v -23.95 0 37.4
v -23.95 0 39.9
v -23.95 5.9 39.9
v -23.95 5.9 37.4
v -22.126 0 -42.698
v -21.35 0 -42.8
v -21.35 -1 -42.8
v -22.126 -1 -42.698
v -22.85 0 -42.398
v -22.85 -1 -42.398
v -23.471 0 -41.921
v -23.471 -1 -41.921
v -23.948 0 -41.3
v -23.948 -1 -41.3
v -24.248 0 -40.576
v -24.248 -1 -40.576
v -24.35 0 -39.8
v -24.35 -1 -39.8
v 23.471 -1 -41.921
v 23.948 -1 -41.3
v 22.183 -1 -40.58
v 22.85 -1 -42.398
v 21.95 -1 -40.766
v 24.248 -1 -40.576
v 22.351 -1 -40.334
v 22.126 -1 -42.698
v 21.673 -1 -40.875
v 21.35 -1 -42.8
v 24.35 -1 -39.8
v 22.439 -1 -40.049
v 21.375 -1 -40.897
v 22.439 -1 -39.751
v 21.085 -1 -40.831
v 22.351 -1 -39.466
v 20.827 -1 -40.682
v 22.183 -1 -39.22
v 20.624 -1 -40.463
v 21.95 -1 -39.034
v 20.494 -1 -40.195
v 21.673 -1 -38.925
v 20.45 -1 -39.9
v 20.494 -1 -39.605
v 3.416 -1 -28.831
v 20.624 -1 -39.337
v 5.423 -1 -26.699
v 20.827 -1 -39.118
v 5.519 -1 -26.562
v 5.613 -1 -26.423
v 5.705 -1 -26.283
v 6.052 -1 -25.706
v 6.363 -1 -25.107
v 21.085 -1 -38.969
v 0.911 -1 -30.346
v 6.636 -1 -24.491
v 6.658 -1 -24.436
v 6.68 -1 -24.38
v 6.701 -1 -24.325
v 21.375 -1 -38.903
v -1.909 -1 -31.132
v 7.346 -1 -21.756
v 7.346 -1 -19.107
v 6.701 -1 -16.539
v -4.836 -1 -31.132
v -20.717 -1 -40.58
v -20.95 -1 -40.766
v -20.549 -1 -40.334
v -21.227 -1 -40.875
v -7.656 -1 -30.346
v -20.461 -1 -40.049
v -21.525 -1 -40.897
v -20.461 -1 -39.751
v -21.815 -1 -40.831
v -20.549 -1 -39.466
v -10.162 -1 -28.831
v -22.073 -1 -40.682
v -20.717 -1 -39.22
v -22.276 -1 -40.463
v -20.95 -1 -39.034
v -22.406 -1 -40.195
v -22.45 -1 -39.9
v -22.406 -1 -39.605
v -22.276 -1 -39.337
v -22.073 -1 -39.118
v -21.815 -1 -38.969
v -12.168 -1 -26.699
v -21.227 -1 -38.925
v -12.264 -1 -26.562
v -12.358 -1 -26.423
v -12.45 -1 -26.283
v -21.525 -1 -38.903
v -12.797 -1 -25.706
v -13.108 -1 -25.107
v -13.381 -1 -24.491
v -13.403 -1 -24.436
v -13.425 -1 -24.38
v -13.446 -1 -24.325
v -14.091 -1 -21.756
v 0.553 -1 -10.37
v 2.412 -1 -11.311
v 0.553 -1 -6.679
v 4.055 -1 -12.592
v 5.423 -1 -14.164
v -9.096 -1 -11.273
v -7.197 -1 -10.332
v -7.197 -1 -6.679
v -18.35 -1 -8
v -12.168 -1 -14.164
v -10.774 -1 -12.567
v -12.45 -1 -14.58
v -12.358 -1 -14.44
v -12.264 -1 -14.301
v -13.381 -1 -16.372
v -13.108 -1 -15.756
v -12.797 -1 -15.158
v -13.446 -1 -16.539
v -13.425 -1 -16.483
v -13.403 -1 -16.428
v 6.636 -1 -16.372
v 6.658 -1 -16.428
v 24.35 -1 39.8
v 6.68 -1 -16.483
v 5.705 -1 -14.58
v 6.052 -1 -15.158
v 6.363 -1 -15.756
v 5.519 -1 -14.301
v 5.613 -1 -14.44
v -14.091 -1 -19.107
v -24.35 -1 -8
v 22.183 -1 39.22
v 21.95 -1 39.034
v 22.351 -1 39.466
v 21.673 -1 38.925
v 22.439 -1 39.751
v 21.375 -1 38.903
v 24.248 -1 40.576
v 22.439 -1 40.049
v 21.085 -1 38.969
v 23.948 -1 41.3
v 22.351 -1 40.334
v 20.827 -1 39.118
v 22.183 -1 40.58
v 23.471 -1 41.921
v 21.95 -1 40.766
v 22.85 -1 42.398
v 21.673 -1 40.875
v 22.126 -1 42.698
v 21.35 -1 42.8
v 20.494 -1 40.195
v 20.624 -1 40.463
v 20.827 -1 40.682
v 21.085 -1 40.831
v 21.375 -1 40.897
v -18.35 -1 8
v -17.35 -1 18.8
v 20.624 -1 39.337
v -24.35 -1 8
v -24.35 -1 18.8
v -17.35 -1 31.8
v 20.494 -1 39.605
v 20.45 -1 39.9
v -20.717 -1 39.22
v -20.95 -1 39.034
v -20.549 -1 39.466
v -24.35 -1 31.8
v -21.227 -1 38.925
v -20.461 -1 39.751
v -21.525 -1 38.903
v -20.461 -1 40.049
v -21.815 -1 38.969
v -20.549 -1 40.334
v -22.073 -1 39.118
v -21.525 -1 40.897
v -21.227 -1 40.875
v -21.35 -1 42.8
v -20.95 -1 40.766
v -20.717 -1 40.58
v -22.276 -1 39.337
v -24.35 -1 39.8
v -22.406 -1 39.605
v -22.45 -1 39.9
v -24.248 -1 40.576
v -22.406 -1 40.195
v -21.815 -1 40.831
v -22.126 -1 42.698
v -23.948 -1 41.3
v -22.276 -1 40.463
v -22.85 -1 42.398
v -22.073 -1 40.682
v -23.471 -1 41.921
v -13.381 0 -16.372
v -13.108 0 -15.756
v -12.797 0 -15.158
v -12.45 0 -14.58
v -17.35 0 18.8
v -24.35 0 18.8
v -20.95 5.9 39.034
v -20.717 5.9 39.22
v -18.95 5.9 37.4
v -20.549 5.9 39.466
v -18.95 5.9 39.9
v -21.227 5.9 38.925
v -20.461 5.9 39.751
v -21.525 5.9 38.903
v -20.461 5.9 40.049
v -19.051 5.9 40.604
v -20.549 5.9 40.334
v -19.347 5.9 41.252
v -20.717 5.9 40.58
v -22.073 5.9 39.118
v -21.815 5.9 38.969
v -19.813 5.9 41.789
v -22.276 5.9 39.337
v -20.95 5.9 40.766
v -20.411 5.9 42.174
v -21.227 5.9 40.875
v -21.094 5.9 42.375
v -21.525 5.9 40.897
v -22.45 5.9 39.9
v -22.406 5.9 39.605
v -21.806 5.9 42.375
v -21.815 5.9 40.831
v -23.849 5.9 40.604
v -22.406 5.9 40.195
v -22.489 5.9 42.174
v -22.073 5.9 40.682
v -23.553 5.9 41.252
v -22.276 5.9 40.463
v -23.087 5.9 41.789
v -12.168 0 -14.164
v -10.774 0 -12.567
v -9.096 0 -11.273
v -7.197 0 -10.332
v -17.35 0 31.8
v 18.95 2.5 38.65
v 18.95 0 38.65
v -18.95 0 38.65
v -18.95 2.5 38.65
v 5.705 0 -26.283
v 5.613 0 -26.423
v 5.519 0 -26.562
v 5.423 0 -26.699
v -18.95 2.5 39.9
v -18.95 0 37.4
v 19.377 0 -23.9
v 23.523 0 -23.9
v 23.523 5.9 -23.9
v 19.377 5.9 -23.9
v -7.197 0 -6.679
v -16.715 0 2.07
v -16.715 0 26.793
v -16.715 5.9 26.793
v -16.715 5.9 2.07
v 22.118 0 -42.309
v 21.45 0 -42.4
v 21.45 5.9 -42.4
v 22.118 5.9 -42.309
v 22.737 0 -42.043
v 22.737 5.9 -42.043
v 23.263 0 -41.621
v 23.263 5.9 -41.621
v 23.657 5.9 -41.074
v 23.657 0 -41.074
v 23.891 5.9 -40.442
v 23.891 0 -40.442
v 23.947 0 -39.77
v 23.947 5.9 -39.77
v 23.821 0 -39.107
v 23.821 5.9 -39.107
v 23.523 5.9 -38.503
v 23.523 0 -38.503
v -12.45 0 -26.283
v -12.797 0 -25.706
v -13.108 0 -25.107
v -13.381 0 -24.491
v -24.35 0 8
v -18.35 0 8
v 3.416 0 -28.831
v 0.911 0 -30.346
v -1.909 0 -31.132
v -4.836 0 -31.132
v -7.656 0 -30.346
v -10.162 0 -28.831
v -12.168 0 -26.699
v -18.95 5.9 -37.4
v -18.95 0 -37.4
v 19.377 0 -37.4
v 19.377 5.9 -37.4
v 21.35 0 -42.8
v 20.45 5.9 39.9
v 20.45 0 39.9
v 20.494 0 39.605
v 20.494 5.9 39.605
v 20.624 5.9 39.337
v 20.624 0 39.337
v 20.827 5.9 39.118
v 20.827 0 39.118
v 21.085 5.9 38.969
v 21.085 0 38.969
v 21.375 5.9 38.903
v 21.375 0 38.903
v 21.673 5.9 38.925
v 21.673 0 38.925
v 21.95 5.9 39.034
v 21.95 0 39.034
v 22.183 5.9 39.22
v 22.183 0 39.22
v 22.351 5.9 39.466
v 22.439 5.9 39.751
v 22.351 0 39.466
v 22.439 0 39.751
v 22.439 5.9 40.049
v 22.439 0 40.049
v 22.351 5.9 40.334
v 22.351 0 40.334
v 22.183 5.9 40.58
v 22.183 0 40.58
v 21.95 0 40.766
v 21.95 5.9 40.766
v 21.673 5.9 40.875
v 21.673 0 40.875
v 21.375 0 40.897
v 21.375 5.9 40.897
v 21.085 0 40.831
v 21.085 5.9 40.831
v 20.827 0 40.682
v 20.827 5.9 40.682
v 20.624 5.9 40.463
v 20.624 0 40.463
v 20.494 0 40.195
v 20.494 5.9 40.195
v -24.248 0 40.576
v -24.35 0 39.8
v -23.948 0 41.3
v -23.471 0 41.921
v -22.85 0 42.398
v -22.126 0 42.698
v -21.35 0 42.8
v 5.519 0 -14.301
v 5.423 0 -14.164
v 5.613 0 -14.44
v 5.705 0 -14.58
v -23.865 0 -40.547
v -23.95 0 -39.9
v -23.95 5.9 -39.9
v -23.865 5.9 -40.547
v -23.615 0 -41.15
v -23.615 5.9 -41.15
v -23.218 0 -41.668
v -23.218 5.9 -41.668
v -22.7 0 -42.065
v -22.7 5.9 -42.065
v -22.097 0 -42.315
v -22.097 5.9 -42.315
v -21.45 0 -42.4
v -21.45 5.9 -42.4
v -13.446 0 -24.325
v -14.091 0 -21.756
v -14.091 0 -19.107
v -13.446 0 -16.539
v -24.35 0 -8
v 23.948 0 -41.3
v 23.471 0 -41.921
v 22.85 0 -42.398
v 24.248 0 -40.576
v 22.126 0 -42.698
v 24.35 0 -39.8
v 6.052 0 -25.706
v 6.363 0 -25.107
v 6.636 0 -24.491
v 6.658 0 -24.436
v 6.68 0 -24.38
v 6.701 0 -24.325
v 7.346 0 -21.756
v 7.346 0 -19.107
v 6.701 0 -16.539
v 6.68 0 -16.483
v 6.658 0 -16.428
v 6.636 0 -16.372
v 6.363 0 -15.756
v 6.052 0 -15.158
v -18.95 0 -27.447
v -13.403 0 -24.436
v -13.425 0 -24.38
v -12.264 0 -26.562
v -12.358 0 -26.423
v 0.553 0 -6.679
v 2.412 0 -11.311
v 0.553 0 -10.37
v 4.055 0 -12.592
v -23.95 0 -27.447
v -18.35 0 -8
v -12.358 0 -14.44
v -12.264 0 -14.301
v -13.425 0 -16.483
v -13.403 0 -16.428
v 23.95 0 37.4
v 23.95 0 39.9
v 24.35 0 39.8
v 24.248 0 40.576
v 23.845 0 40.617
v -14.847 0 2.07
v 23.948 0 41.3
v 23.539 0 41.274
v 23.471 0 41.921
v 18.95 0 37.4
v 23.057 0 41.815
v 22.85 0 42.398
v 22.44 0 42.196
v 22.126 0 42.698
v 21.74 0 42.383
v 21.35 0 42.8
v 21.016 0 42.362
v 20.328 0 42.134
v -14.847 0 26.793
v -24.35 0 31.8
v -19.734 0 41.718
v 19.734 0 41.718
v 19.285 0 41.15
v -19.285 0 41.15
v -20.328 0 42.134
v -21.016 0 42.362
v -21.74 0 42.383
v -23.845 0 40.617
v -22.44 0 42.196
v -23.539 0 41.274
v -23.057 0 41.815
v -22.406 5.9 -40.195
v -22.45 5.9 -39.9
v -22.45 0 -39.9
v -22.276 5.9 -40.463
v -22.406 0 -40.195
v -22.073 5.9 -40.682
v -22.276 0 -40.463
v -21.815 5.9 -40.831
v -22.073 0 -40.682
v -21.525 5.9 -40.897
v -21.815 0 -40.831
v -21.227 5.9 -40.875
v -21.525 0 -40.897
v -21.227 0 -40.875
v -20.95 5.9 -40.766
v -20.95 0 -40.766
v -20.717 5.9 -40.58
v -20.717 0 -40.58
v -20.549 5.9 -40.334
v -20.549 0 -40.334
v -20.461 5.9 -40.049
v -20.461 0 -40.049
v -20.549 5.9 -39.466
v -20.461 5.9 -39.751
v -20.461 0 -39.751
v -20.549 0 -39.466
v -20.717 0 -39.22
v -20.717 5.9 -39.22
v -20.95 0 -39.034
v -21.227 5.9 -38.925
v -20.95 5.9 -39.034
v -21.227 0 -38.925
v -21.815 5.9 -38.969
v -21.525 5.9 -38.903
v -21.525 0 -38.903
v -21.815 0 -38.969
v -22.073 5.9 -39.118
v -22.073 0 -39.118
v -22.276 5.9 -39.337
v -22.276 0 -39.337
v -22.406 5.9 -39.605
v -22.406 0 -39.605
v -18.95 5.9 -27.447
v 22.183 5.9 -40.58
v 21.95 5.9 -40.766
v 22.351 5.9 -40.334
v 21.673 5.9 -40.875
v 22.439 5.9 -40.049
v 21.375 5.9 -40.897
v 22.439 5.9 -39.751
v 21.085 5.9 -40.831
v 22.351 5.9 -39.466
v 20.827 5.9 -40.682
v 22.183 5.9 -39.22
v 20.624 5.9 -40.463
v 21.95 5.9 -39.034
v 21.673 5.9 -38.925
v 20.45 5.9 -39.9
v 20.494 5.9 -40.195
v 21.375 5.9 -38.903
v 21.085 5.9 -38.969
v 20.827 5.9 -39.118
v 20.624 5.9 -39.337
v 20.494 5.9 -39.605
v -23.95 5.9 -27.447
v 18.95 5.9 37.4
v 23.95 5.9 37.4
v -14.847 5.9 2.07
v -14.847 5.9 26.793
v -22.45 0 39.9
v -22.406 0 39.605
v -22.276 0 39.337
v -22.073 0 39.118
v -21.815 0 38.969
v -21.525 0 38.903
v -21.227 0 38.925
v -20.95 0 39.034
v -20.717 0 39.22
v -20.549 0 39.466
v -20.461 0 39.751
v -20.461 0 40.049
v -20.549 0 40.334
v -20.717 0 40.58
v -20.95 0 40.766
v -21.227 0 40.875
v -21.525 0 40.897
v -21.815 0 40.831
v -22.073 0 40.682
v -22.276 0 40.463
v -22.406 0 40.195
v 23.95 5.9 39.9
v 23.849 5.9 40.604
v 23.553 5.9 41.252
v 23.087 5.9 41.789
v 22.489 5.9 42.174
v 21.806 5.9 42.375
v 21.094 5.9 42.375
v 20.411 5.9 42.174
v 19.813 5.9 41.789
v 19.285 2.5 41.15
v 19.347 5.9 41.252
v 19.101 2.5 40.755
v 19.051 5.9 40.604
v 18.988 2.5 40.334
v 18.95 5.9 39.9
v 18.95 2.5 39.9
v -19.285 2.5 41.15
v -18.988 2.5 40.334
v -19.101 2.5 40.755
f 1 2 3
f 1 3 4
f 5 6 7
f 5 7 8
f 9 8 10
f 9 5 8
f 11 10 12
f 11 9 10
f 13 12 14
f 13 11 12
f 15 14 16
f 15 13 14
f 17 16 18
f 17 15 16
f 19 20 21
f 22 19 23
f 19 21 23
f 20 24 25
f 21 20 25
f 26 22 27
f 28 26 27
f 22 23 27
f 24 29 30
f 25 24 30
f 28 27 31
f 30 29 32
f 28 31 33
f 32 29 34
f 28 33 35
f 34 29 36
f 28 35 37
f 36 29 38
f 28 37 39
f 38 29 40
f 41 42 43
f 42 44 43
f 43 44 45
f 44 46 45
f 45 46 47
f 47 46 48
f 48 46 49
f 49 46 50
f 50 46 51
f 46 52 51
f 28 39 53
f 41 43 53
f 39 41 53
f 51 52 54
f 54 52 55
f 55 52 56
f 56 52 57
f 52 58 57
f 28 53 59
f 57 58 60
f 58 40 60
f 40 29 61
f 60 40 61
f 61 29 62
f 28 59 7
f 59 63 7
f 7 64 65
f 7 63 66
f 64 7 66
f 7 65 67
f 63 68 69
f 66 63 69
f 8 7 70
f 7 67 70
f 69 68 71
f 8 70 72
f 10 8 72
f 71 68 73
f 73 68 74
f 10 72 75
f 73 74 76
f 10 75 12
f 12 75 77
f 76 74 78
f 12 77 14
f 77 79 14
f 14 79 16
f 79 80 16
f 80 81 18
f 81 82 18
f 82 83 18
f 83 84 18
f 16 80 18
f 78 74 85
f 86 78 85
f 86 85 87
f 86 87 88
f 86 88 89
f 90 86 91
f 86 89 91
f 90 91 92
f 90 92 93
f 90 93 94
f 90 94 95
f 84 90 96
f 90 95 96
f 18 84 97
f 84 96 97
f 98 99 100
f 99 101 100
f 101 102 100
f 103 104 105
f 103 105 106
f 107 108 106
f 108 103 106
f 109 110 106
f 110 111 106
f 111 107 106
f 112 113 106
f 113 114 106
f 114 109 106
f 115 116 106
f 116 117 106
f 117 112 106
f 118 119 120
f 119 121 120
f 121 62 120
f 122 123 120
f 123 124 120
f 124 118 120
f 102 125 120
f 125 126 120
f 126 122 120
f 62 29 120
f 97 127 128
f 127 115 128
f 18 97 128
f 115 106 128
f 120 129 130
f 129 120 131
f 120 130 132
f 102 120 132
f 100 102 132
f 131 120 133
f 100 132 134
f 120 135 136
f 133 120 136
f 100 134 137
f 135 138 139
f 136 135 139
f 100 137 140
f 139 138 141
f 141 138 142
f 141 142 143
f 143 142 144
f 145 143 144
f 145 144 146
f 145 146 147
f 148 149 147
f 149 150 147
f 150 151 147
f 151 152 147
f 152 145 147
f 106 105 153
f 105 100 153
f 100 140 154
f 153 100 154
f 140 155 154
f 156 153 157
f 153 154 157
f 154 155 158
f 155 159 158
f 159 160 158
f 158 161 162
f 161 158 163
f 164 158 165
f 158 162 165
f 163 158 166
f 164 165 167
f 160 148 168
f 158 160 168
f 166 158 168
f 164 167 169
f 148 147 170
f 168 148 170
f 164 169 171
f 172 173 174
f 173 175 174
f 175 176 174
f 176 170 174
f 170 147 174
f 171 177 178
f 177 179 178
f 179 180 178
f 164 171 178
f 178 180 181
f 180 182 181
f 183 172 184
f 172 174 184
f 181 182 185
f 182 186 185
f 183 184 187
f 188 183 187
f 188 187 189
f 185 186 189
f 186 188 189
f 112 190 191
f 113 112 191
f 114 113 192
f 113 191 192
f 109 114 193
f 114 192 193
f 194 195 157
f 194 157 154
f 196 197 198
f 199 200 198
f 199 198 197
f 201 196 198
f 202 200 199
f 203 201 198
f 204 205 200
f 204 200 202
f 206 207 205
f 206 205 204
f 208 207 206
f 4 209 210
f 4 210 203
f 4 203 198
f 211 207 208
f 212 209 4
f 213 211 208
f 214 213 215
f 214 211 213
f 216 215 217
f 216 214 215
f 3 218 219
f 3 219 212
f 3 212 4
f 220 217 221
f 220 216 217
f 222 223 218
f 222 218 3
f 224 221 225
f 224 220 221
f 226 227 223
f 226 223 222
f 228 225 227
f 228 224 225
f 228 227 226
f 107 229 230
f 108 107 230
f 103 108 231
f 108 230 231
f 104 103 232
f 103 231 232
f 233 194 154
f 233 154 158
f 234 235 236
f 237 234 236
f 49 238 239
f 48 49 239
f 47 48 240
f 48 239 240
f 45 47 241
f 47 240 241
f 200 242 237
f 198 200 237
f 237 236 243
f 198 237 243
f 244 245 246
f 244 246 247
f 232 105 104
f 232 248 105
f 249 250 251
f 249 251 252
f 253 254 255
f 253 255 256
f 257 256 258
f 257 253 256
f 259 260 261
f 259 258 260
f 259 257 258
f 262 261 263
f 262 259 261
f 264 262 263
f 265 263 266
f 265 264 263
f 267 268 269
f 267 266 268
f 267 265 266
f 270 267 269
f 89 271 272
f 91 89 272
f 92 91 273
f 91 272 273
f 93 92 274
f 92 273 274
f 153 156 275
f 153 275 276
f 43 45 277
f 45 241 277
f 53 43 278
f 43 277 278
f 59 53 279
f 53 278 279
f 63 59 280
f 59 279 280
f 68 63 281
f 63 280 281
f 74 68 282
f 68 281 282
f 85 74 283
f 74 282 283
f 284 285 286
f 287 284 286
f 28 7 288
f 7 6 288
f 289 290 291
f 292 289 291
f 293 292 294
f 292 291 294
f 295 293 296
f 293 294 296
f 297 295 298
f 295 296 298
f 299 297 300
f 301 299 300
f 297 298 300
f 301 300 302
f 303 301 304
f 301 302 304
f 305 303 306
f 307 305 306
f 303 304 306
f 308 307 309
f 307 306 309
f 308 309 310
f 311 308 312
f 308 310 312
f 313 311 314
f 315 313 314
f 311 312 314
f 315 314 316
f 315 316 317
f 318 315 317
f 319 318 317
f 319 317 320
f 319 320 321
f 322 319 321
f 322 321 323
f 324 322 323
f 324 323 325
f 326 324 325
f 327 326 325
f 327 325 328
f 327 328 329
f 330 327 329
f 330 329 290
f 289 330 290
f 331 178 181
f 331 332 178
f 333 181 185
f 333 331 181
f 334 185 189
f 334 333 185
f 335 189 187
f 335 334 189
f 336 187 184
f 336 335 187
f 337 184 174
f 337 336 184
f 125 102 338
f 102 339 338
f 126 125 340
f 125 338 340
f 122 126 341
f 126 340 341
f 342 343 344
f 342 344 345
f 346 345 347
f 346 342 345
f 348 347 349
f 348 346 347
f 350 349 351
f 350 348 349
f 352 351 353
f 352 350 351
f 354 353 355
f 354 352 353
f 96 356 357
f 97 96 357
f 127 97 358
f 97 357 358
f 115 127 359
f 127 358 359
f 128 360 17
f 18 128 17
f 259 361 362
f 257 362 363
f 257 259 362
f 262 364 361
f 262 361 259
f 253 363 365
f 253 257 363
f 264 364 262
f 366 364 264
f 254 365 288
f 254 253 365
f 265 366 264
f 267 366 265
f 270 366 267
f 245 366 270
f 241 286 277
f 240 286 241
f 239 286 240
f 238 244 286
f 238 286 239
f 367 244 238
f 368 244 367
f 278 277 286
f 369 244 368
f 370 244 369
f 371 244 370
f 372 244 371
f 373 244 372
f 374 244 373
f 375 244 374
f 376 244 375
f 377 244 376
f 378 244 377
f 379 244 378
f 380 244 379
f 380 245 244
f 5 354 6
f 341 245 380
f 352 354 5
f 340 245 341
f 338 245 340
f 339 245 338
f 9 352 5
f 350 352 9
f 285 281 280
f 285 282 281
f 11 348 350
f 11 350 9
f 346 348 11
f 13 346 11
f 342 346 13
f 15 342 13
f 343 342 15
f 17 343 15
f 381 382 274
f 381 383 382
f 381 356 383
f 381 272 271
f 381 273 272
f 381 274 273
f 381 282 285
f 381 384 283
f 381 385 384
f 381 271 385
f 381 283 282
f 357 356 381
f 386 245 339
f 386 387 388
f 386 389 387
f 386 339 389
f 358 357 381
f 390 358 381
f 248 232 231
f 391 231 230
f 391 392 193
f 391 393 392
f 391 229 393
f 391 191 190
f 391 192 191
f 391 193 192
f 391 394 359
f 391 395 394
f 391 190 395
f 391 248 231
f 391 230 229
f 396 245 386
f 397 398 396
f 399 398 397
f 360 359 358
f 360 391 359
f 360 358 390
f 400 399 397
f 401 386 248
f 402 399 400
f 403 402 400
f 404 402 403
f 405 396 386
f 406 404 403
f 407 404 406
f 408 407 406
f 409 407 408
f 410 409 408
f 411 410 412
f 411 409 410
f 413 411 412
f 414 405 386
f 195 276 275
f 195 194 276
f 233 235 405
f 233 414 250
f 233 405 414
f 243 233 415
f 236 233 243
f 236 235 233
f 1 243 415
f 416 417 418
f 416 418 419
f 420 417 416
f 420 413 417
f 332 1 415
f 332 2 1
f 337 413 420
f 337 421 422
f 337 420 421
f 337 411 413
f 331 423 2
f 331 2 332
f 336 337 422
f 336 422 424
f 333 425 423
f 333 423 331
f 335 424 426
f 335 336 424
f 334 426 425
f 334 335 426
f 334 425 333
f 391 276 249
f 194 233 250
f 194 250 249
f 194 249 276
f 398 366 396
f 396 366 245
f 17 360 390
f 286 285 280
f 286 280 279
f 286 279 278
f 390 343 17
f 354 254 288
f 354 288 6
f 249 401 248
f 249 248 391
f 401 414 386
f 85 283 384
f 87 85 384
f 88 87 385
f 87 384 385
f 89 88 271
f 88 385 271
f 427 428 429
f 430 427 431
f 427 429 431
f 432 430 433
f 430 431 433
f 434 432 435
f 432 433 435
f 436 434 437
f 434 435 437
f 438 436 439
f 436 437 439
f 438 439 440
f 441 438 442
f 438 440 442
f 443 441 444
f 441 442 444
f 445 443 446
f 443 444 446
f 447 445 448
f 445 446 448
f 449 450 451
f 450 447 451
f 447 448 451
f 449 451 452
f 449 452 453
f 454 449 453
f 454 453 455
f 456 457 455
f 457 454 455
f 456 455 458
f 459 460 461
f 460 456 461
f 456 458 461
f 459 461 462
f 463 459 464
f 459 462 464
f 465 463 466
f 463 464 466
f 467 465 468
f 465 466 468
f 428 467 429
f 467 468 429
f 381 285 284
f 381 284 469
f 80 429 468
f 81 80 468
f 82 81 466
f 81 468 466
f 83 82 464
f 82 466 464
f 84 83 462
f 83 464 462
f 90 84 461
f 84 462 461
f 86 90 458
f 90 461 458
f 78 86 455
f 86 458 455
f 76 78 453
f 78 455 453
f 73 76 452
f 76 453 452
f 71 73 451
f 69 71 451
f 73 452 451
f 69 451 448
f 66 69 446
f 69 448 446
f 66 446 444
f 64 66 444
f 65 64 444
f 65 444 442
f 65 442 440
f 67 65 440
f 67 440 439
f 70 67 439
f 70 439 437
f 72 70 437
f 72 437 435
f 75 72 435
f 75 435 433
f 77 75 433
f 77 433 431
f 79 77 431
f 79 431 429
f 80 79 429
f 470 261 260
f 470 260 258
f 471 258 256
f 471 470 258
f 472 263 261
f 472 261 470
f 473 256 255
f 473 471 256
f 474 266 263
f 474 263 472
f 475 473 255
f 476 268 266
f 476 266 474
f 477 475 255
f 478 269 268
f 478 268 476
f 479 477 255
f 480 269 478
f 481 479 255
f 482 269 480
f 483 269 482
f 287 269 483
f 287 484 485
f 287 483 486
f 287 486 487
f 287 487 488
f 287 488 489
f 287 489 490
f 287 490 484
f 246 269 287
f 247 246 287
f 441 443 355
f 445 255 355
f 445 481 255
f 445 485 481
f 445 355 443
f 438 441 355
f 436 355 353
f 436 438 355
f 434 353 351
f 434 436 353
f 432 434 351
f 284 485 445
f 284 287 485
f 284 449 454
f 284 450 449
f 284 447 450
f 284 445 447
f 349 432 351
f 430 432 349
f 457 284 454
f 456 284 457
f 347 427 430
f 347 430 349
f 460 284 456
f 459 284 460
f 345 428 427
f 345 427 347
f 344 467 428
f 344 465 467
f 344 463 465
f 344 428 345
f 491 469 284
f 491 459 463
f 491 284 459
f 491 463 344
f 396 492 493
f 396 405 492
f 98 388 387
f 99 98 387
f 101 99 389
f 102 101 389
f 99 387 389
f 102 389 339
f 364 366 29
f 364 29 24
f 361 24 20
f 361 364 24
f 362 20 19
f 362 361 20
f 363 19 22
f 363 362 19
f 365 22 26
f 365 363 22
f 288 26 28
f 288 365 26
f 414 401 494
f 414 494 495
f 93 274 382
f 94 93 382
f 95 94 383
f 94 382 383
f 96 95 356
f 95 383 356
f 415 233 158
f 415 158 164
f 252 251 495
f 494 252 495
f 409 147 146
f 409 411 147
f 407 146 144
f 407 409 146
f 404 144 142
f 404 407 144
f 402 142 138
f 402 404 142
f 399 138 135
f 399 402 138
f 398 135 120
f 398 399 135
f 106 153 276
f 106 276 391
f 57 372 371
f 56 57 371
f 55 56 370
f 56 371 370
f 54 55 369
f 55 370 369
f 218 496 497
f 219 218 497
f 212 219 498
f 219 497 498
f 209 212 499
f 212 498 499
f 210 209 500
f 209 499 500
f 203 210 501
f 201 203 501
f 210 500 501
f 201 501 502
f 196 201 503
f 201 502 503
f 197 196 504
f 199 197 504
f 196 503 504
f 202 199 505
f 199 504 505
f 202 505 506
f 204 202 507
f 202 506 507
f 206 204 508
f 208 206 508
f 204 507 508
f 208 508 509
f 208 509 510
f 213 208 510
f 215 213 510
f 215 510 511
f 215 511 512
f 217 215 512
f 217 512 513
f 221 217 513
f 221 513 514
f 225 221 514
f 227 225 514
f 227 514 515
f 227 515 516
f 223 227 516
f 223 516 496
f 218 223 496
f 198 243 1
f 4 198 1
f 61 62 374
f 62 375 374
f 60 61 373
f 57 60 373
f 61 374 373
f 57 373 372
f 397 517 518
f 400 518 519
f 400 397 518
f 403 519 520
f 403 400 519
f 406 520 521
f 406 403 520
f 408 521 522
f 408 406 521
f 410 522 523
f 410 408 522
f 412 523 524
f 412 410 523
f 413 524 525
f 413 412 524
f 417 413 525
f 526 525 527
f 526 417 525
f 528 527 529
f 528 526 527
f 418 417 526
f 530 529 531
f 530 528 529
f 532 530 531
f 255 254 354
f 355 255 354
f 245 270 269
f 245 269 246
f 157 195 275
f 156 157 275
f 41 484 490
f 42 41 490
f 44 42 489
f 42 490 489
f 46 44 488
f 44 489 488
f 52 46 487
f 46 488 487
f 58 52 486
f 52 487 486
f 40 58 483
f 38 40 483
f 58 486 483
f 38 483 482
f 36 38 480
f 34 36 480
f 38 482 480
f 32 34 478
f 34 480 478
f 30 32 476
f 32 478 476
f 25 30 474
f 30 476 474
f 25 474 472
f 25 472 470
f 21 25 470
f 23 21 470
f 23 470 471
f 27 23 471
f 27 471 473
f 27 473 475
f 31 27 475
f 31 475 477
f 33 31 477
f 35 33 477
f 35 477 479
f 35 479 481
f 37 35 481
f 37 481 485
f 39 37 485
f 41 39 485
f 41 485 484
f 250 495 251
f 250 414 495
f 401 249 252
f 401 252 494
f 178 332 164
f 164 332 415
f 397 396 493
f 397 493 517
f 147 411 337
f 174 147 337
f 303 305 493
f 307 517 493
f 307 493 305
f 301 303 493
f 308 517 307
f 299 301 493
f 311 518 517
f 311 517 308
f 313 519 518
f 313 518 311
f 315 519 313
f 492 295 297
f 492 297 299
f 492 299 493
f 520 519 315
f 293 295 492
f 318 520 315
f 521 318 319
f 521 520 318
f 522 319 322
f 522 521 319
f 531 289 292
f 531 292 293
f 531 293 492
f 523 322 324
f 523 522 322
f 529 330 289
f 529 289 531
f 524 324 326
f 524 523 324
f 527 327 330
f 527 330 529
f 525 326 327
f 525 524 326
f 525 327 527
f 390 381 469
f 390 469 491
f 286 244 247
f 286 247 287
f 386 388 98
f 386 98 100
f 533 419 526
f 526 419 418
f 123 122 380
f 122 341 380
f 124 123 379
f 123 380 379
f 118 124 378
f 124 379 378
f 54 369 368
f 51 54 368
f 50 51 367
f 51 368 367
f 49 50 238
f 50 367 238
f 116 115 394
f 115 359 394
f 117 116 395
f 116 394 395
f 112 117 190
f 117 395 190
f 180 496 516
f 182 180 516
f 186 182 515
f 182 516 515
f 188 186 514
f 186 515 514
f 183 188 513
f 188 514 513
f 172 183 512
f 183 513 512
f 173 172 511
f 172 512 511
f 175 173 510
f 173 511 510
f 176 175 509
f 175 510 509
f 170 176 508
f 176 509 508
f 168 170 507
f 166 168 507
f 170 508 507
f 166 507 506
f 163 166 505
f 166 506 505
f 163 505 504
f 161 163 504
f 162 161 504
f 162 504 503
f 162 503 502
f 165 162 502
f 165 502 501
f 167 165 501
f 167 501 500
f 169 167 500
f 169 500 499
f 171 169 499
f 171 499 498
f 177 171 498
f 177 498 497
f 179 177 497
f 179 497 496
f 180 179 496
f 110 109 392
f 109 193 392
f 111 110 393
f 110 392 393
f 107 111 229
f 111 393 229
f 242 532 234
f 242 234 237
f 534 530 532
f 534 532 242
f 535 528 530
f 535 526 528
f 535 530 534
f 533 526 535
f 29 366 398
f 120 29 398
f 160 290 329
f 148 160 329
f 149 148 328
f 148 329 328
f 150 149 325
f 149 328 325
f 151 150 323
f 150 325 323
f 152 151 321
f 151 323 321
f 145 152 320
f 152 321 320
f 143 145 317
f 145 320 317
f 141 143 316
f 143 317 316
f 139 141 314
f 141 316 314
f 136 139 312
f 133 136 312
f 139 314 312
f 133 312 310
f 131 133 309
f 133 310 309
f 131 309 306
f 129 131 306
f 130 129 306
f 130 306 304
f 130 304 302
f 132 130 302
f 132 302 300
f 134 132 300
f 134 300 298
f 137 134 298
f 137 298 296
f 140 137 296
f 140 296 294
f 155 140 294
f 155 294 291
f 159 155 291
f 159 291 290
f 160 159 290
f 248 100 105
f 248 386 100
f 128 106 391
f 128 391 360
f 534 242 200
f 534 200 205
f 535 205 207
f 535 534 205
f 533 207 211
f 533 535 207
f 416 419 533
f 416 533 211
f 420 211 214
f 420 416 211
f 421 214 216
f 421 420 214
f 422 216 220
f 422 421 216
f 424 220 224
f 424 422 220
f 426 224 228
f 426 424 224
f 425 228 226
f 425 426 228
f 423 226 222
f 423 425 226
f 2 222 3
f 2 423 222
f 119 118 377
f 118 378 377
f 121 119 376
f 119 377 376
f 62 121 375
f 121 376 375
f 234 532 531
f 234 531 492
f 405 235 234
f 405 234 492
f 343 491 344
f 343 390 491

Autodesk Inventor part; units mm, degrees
ref_plane "YZ Plane" through (0, 0, 0) normal (1, 0, 0) x (0, 1, 0)
ref_plane "XZ Plane" through (0, 0, 0) normal (0, 1, 0) x (-1, 0, 0)
ref_plane "XY Plane" through (0, 0, 0) normal (0, 0, 1) x (1, 0, 0)
sketch "Sketch1" plane through (0, 0, 0) normal (0, 1, 0) x (-1, 0, 0)
  line L0 (-21.35, 42.8) -> (21.35, 42.8)
  line L1 (24.35, 39.8) -> (24.35, -39.8)
  line L2 (21.35, -42.8) -> (-21.35, -42.8)
  line L3 (-24.35, -39.8) -> (-24.35, 39.8)
  arc A0 (24.35, 39.8) -> (21.35, 42.8) centre (21.35, 39.8) ccw
  arc A1 (21.35, -42.8) -> (24.35, -39.8) centre (21.35, -39.8) ccw
  arc A2 (-24.35, -39.8) -> (-21.35, -42.8) centre (-21.35, -39.8) ccw
  arc A3 (-21.35, 42.8) -> (-24.35, 39.8) centre (-21.35, 39.8) ccw
  line L4 (-47.6975, 0) -> (69.2667, 0) construction
  point P0 (0, 0)
  dimension "d2" = 3
sketch "Sketch2" plane through (0, 0, 0) normal (0, 1, 0) x (-1, 0, 0)
  line L0 (-24.35, 42.8) -> (24.35, -42.8) construction
  line L1 (24.35, 42.8) -> (-24.35, -42.8) construction
  circle A0 centre (21.45, 39.9) radius 1
  line L2 (0, 76.772) -> (0, -116.4578) construction
  circle A1 centre (21.45, 39.9) radius 2.5
  line L3 (19.2849, 41.15) -> (-19.2849, 41.15)
  line L4 (-19.2849, 41.15) -> (-19.2849, 38.65)
  line L5 (-19.2849, 38.65) -> (19.2849, 38.65)
  line L6 (19.2849, 38.65) -> (19.2849, 41.15)
  circle A2 centre (-21.45, 39.9) radius 2.5
  circle A3 centre (-21.45, 39.9) radius 1
  line L7 (23.95, 39.9) -> (18.95, 39.9)
  line L8 (18.95, 39.9) -> (18.95, 37.4)
  line L9 (18.95, 37.4) -> (23.95, 37.4)
  line L10 (-23.95, 39.9) -> (-18.95, 39.9)
  line L11 (-18.95, 37.4) -> (-23.95, 37.4)
  line L12 (-18.95, 39.9) -> (-18.95, 37.4)
  line L13 (24.35, 39.8) -> (24.35, -39.8) projected
  line L14 (-21.35, 42.8) -> (21.35, 42.8) projected
  arc A4 (24.35, 39.8) -> (21.35, 42.8) centre (21.35, 39.8) ccw projected
  line L15 (23.95, 39.9) -> (23.95, 37.4)
  line L16 (-23.95, 37.4) -> (-23.95, 39.9)
  point P0 (0, 0)
  point P1 (0, 0)
  point P2 (-21.35, 39.8)
  point P3 (21.45, 39.9)
  point P4 (-18.95, 38.65)
  point P5 (18.95, 38.65)
  point P6 (-21.45, 37.4)
  dimension "d16" = 48.7
  dimension "d17" = 2
  dimension "d18" = 5
  dimension "d19" = 2.5
  dimension "d20" = 2.5
  dimension "d23" = 2.9
  dimension "d24" = 2.9
  dimension "d25" = 2.9
sketch "Sketch4" plane through (0, 0, 0) normal (0, 1, 0) x (-1, 0, 0)
  circle A0 centre (21.45, -39.9) radius 2.5
  circle A1 centre (21.45, -39.9) radius 1
  circle A2 centre (-21.45, -39.9) radius 1
  circle A3 centre (-21.45, -39.9) radius 2.5
  line L0 (23.95, -39.9) -> (18.95, -39.9)
  line L1 (18.95, -39.9) -> (18.95, -27.4467)
  line L2 (18.95, -27.4467) -> (23.95, -27.4467)
  line L3 (23.95, -27.4467) -> (23.95, -39.9)
  line L4 (21.45, -37.4) -> (-21.45, -37.4)
  line L5 (-21.45, -37.4) -> (-21.45, -42.4)
  line L6 (-21.45, -42.4) -> (21.45, -42.4)
  line L7 (21.45, -42.4) -> (21.45, -37.4)
  line L8 (-19.377, -38.5026) -> (-23.523, -38.5026)
  line L9 (-23.523, -38.5026) -> (-23.523, -23.9)
  line L10 (-23.523, -23.9) -> (-19.377, -23.9)
  line L11 (-19.377, -23.9) -> (-19.377, -38.5026)
  point P0 (0, 0)
  point P1 (21.35, -42.8)
  point P2 (24.35, -39.8)
  point P3 (21.35, -39.8)
  point P4 (-24.35, -39.8)
  point P5 (-21.35, -42.8)
  point P6 (-21.35, -39.8)
  point P7 (18.95, -37.4)
  point P8 (-19.377, -37.4)
  point P9 (-21.45, -23.9)
  point P10 (-21.45, -39.9)
  dimension "d52" = 16
sketch "Sketch5" plane through (0, 0, 0) normal (0, 1, 0) x (-1, 0, 0)
  line L0 (24.35, 39.8) -> (24.35, -39.8) projected
  line L1 (24.35, 8) -> (18.35, 8)
  line L2 (18.35, 8) -> (18.35, -8)
  line L3 (18.35, -8) -> (24.35, -8)
  line L4 (24.35, -8) -> (24.35, 8)
  line L5 (31.157, 0) -> (-16.4919, 0) projected
  point P0 (0, 0)
  point P1 (18.35, 0)
  point P2 (21.35, -8)
  dimension "d21" = 16
  dimension "d22" = 6
extrude "Extrusion2" add sketch "Sketch1" against normal blind 1
extrude "Extrusion3" add sketch "Sketch2" along normal blind 2.5 contours A1 L8 L5 L12 A2 L3
extrude "Extrusion4" add sketch "Sketch2" along normal blind 5.9 contours L7 A1 L6 A0 | A0 L7 L6 A1 | L15 L9 A1 | L7 A1 L6 | L6 A1 L7 | L9 L8 L5 A1 | L5 L8 A1 | A2 L10 L4 | L4 L10 A3 A2 | L10 A2 L4 | L4 A2 L10 A3 | L12 L5 A2 | A2 L11 L16 | L12 L11 A2 L5
extrude "Extrusion5" add sketch "Sketch4" along normal up to surface (5.9 mm away) contours L0 A1 L7 A0 | A0 L7 A1 L0 | A0 L4 L1 L2 L3 | L7 A1 L0 A0 | A0 L1 L4 | L6 A3 L11 L4 L1 A0 | A0 L0 A1 L7 | L5 A2 L8 A3 | A3 L8 L5 A2 | L11 A3 L4 | L4 A3 L9 L10 L11 | A3 L5 L8 | A3 L8 L5
extrude "Extrusion6" cut sketch "Sketch4" along normal through all both and the other way through all contours L0 L7 A1 | A1 L7 L0 | L7 L0 A1 | A1 L0 L7 | L5 A2 | A2 L5
extrude "Extrusion7" cut sketch "Sketch2" along normal through all both and the other way through all contours L7 A0 | A0 L7 | L10 A3 | A3 L10
extrude "Extrusion8" cut sketch "Sketch5" along normal through all both and the other way through all
sketch "Sketch6" plane through (0, -1, 0) normal (0, -1, 0) x (1, 0, 0)
  arc A0 (5.4227, -14.164) -> (0.5528, -10.3702) centre (-3.3726, -20.4316) ccw
  line L0 (0.5528, -10.3702) -> (0.5528, -6.679)
  line L1 (0.5528, -6.679) -> (-2.7471, -6.679)
  line L2 (-2.7471, -6.679) -> (-3.9471, -6.679)
  line L3 (-3.9471, -6.679) -> (-7.1971, -6.679)
  line L4 (-7.1971, -6.679) -> (-7.1971, -10.3315)
  arc A1 (-7.1971, -10.3315) -> (-12.1679, -14.164) centre (-3.3726, -20.4316) ccw
  arc A2 (-12.45, -14.5801) -> (-13.3806, -16.3723) centre (-3.3726, -20.4316) ccw
  arc A3 (-13.4465, -16.5387) -> (-13.4465, -24.3246) centre (-3.3726, -20.4316) ccw
  arc A4 (-13.3806, -24.491) -> (-12.45, -26.2832) centre (-3.3726, -20.4316) ccw
  arc A5 (-12.1679, -26.6992) -> (5.4227, -26.6992) centre (-3.3726, -20.4316) ccw
  arc A6 (5.7048, -26.2832) -> (6.6355, -24.491) centre (-3.3726, -20.4316) ccw
  arc A7 (6.7014, -24.3246) -> (6.7014, -16.5387) centre (-3.3726, -20.4316) ccw
  arc A8 (6.6355, -16.3723) -> (5.7048, -14.5801) centre (-3.3726, -20.4316) ccw
  arc A9 (-7.1971, -10.3315) -> (0.5528, -10.3702) centre (-3.3726, -20.4316) ccw
  point P0 (0, 0)
  point P1 (-13.3806, -24.491)
  point P2 (-12.45, -26.2832)
  point P3 (-12.1679, -26.6992)
  point P4 (5.7048, -26.2832)
  point P5 (6.6355, -24.491)
  point P6 (6.7014, -24.3246)
  point P7 (6.6355, -16.3723)
  point P8 (5.7048, -14.5801)
  point P9 (5.4227, -14.164)
extrude "Extrusion9" cut sketch "Sketch6" along normal through all both and the other way through all
sketch "Sketch7" plane through (0, -1, 0) normal (0, -1, 0) x (1, 0, 0)
  line L0 (-9.9467, 38.1508) -> (9.6849, 38.1508) construction
  line L1 (9.6849, 38.1508) -> (9.6849, 29.6438) construction
  line L2 (9.6849, 29.6438) -> (-9.9467, 29.6438) construction
  line L3 (-9.9467, 29.6438) -> (-9.9467, 38.1508) construction
  point P0 (0, 0)
sketch "Sketch8" plane through (0, -1, 0) normal (0, -1, 0) x (1, 0, 0)
  line L0 (-24.35, 39.8) -> (-24.35, -39.8) projected
  line L1 (-24.35, 8) -> (-24.35, 39.8) projected
  line L2 (-24.35, 18.8) -> (-17.35, 18.8)
  line L3 (-17.35, 18.8) -> (-17.35, 31.8)
  line L4 (-17.35, 31.8) -> (-24.35, 31.8)
  line L5 (-24.35, 31.8) -> (-24.35, 18.8)
  line L6 (21.35, 42.8) -> (-21.35, 42.8) projected
  point P0 (0, 0)
  dimension "d43" = 7
  dimension "d45" = 24
  dimension "d46" = 11
extrude "Extrusion10" cut sketch "Sketch8" along normal through all both and the other way through all
sketch "Sketch9" plane through (0, 0, 0) normal (0, 1, 0) x (1, 0, 0)
  line L0 (-14.8468, -26.7931) -> (-16.7148, -26.7931)
  line L1 (-16.7148, -26.7931) -> (-16.7148, -2.0705)
  line L2 (-16.7148, -2.0705) -> (-14.8468, -2.0705)
  line L3 (-14.8468, -2.0705) -> (-14.8468, -26.7931)
  point P0 (0, 0)
extrude "Extrusion11" add sketch "Sketch9" along normal up to surface (5.9 mm away)
properties part number "my_back_metric"
